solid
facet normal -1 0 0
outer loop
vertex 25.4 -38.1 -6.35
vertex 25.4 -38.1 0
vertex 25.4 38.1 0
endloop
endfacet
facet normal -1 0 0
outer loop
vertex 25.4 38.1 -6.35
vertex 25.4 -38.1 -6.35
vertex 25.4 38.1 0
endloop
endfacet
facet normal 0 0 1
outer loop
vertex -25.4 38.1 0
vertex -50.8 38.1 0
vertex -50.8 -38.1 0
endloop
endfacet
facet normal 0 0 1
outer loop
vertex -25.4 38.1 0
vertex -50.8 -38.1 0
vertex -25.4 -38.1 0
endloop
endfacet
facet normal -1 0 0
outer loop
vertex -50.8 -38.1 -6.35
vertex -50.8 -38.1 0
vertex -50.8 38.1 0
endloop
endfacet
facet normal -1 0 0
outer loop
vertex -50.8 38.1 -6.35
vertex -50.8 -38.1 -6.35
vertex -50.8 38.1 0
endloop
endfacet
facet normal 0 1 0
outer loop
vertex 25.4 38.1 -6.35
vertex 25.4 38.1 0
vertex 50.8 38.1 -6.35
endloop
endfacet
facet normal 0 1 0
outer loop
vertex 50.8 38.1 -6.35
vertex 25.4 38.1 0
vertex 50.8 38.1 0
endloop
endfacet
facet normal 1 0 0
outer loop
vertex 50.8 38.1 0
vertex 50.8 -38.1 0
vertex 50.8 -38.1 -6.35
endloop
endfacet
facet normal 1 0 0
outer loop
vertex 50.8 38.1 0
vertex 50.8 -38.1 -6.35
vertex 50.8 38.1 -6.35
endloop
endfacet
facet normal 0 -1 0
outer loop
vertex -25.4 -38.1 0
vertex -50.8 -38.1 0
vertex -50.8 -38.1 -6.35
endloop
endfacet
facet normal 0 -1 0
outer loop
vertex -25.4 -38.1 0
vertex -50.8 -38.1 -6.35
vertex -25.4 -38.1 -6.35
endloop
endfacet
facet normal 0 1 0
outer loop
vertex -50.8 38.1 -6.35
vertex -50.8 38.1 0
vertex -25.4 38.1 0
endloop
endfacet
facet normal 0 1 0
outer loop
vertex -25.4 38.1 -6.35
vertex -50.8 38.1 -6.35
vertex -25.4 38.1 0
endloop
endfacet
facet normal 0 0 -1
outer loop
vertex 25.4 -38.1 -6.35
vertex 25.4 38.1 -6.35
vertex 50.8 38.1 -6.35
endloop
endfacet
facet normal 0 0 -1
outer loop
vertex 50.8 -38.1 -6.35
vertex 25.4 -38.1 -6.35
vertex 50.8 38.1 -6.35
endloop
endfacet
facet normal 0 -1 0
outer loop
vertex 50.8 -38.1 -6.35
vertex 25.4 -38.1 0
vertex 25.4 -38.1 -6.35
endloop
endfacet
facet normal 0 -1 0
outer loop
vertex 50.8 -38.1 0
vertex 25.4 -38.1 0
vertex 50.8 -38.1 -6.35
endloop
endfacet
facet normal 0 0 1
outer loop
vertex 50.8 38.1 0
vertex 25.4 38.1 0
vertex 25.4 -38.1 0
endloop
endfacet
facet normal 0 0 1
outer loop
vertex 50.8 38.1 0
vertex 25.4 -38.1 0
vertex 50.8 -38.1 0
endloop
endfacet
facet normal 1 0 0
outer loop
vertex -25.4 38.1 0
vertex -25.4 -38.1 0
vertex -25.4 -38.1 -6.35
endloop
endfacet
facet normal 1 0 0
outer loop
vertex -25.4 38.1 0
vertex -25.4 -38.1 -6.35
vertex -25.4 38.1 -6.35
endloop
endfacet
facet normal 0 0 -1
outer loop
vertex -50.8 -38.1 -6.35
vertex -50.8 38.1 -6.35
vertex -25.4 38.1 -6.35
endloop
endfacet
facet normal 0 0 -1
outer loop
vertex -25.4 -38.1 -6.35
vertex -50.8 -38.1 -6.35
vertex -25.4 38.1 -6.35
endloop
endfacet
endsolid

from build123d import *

# Parameters (mm, degrees)
F0_W     = 25.4
F0_H     = 76.2
F1_DEPTH = 6.35


with BuildPart() as f1:
    # F0 (on Top) → F1 (new body)
    with BuildSketch(Plane.XY):
        with Locations((-38.1, 0)):
            Rectangle(F0_W, F0_H)
        with Locations((38.1, 0)):
            Rectangle(F0_W, F0_H)
    extrude(amount=-F1_DEPTH)


solid = f1.part
